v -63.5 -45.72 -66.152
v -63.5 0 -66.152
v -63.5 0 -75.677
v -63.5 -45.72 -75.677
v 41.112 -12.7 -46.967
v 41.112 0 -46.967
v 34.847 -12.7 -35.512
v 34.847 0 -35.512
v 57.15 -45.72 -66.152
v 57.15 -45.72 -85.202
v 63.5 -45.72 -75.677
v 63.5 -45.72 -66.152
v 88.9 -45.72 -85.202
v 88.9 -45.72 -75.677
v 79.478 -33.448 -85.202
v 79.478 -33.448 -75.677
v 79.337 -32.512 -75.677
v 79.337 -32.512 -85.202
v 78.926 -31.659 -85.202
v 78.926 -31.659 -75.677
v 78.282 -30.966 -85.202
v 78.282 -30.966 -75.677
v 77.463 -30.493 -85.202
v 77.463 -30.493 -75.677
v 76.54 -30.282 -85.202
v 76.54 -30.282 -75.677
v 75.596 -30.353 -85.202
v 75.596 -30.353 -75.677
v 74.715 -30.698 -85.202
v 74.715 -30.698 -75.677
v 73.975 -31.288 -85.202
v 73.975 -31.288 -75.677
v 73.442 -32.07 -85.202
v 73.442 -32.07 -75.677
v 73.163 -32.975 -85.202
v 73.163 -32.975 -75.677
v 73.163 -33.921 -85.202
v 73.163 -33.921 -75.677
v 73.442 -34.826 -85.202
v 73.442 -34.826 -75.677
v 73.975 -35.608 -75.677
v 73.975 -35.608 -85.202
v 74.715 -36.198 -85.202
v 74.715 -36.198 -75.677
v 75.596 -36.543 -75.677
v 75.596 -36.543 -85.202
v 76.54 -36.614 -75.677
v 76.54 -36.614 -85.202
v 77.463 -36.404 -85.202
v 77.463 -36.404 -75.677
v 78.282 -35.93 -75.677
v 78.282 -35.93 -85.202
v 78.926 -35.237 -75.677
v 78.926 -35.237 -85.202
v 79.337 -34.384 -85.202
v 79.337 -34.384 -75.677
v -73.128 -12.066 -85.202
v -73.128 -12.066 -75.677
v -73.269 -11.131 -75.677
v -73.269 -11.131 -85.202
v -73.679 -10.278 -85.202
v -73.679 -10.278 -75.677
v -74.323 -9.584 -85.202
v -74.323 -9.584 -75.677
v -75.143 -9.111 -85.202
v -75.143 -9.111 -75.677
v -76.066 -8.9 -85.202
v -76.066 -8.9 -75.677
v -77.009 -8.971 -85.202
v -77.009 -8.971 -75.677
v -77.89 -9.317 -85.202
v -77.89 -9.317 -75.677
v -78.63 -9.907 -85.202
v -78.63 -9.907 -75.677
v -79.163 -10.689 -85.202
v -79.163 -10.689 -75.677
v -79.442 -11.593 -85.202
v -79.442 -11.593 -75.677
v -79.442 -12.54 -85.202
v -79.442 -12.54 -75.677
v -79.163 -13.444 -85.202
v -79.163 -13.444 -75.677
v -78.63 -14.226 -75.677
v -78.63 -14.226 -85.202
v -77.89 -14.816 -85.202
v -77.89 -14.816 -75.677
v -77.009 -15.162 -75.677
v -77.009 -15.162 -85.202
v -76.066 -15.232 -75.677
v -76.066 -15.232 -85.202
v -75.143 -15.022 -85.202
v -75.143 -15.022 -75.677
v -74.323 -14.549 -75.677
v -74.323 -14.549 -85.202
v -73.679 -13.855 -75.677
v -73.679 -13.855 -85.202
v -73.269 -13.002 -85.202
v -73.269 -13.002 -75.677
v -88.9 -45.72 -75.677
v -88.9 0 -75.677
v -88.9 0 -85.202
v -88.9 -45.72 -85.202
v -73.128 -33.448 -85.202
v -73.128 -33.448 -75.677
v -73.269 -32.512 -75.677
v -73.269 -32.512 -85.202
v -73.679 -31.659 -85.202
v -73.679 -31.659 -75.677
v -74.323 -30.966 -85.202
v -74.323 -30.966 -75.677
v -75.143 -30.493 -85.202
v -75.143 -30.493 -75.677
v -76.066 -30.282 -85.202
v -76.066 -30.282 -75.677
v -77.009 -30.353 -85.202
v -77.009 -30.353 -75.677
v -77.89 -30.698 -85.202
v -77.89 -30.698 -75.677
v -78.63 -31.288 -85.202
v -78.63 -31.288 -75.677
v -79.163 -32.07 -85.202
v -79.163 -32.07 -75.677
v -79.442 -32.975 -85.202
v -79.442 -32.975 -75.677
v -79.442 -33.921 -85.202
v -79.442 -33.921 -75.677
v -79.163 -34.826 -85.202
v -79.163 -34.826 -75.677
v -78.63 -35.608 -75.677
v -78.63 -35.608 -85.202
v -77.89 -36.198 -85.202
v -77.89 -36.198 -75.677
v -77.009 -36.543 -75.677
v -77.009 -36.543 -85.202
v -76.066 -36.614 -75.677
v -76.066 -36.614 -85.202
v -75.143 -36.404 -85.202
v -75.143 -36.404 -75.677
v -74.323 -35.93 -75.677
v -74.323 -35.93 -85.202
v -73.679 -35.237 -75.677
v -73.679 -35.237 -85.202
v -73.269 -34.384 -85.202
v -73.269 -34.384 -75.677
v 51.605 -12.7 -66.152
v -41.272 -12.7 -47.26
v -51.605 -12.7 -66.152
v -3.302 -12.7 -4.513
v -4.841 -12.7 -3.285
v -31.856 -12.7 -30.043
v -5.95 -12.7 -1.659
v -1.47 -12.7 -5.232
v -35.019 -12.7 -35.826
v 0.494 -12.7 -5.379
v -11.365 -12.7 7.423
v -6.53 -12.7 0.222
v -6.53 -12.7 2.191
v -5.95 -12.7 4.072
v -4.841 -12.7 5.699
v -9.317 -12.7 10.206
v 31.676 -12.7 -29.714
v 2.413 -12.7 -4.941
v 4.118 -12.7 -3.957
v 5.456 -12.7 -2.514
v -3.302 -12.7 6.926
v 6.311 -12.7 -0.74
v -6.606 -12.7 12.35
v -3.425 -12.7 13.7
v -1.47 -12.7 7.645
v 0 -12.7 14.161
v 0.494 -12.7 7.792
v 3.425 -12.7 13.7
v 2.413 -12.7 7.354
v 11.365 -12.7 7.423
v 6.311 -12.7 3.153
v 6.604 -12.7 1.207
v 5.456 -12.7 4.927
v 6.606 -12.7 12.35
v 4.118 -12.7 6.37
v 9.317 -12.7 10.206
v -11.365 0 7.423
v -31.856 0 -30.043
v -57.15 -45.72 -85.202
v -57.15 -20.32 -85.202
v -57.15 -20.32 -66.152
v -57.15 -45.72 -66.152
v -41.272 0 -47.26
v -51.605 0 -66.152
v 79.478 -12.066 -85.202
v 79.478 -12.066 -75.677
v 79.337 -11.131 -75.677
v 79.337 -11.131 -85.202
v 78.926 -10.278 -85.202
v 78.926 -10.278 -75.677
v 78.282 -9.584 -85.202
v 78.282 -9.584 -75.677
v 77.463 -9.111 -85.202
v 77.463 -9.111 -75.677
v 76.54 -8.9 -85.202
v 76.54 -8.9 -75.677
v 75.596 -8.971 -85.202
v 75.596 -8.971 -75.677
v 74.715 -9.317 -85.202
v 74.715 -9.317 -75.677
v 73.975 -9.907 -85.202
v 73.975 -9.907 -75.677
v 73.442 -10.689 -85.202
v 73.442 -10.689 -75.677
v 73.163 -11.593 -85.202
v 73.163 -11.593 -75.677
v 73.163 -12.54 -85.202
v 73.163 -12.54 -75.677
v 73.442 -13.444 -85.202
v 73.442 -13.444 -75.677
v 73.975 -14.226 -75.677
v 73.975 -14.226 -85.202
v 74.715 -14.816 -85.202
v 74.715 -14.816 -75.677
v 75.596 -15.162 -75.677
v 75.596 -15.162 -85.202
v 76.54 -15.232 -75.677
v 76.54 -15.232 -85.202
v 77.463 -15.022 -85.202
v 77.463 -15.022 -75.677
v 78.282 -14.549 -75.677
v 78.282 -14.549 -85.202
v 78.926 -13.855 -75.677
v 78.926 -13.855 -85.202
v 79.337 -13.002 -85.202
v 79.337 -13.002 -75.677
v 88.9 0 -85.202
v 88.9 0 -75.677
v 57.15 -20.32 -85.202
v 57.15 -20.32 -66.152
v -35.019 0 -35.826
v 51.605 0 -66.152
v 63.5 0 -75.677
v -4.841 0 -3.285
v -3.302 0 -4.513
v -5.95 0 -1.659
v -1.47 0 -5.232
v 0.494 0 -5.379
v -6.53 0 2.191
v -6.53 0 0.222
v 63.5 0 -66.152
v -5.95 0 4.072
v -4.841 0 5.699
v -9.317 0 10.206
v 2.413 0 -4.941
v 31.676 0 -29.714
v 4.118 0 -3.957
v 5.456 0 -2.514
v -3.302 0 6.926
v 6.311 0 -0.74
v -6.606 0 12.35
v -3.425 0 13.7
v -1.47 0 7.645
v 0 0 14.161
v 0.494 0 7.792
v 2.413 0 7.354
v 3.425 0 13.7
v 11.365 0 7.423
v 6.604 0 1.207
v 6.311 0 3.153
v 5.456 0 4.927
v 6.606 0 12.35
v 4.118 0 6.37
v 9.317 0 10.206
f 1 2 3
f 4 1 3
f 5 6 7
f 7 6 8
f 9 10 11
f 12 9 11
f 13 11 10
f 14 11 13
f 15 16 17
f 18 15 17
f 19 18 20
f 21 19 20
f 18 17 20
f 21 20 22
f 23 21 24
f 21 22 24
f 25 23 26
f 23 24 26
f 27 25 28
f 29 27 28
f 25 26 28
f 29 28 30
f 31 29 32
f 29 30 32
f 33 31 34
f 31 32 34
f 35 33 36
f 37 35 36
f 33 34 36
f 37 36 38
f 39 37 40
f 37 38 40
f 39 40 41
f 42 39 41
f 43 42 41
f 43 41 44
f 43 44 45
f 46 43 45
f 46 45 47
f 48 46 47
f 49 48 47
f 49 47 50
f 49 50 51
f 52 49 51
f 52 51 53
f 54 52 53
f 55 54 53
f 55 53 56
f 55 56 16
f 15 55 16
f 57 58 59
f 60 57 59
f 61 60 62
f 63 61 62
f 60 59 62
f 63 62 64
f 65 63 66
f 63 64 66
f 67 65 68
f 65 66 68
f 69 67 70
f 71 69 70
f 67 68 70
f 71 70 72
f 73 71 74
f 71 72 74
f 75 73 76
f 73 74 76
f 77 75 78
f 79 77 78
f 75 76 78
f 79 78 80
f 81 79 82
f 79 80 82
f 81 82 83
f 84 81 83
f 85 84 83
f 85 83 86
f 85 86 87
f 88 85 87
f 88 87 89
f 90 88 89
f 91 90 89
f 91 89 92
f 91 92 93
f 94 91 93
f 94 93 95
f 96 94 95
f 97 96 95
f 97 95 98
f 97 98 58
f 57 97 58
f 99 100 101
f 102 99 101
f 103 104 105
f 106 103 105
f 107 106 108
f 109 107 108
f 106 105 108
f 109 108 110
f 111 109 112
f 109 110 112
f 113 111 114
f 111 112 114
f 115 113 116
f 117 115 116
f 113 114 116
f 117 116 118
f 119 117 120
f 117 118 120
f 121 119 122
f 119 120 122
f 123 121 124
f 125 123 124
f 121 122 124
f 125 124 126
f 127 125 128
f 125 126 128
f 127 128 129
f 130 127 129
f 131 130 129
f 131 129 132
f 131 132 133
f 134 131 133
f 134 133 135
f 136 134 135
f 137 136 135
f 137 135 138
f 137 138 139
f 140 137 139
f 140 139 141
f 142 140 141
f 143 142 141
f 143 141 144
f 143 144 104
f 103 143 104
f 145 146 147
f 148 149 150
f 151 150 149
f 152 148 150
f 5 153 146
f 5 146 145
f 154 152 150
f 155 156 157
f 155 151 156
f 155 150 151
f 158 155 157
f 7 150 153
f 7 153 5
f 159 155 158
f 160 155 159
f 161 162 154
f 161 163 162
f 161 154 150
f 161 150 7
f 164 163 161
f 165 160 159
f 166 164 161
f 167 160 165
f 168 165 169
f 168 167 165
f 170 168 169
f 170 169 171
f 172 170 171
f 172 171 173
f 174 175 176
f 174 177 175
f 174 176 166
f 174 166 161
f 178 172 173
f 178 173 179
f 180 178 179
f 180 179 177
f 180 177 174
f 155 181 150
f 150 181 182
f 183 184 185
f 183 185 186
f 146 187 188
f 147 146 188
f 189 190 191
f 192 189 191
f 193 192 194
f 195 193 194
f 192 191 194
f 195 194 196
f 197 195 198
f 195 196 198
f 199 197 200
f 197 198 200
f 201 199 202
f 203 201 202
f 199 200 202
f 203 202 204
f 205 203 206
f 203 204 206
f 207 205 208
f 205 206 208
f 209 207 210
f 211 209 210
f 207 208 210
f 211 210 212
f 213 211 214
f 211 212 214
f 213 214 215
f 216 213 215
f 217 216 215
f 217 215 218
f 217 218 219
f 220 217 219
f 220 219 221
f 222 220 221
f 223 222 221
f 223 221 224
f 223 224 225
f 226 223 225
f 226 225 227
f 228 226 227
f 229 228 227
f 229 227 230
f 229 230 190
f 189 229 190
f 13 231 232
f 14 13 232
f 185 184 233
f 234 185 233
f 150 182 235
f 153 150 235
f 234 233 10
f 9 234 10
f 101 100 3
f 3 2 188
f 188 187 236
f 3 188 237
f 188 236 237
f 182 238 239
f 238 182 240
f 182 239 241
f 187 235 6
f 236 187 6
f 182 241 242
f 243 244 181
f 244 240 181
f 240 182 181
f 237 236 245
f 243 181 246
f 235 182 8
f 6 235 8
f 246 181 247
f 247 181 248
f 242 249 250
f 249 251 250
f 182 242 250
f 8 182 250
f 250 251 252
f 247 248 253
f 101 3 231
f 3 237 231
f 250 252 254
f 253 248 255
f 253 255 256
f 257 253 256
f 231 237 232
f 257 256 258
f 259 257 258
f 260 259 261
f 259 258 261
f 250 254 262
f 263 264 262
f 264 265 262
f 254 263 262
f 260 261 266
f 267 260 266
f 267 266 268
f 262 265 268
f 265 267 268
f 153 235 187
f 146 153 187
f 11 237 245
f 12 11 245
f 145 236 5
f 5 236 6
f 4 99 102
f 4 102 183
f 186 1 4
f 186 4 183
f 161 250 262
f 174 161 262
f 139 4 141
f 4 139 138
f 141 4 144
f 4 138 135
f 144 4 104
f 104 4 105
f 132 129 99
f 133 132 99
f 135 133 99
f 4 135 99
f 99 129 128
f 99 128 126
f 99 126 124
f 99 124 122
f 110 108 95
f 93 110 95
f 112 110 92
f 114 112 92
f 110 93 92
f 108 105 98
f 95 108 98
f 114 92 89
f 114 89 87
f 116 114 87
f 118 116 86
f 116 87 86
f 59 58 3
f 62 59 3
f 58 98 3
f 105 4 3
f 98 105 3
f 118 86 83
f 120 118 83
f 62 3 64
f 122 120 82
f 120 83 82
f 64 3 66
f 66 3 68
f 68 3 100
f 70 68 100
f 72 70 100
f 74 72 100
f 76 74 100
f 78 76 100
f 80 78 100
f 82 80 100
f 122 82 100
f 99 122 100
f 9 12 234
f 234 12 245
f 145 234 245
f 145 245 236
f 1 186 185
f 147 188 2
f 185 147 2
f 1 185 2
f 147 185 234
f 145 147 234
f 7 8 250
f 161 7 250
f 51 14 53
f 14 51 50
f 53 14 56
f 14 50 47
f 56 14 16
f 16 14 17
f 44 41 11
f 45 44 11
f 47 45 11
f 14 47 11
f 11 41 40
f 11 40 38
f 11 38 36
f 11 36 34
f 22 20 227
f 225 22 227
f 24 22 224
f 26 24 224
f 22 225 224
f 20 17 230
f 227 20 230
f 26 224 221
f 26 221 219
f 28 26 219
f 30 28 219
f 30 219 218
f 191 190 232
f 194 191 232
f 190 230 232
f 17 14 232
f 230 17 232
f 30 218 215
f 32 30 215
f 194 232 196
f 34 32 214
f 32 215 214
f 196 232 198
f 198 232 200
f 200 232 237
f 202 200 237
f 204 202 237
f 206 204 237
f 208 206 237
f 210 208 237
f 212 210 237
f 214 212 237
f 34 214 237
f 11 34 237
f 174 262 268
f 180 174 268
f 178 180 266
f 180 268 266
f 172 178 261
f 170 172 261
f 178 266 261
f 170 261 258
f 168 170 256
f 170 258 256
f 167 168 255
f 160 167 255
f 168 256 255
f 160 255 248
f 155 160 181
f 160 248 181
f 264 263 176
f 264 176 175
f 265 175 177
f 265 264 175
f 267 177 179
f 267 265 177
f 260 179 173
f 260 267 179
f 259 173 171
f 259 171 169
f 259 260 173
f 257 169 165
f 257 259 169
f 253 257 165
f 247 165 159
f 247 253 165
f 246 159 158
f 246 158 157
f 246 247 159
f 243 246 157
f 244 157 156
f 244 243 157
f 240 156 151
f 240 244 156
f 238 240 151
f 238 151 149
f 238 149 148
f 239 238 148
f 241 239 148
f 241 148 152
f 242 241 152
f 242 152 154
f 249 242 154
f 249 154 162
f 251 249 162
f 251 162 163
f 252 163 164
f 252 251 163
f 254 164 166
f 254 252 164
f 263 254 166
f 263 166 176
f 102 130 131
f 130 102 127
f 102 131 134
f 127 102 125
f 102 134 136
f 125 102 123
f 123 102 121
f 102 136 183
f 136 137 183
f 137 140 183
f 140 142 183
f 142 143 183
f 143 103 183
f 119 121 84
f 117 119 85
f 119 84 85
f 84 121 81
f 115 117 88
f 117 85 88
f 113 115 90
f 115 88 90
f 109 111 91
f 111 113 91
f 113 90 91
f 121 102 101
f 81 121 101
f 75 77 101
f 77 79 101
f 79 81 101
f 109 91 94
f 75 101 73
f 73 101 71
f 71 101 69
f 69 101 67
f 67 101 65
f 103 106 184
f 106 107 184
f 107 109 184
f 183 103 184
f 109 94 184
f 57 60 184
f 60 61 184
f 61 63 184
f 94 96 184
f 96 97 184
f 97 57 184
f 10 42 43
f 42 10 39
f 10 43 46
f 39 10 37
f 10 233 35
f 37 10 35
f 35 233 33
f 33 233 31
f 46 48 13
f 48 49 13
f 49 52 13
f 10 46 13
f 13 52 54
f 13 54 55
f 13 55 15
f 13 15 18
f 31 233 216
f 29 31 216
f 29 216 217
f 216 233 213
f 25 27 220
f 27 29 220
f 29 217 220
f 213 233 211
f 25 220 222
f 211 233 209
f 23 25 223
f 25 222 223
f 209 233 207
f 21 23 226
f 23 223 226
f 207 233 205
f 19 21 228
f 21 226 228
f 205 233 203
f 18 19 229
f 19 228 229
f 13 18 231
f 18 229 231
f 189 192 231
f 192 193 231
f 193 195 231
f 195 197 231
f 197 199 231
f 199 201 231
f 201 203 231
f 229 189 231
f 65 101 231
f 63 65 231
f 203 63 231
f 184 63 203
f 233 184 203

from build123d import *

# Parameters (mm, degrees)
F0_R     = 6.604
F1_DEPTH = 12.7
F2_DEPTH = 45.72
F3_R     = 3.175
F4_DEPTH = 9.526
F5_W     = 114.3
F5_H     = 25.4
F6_DEPTH = 99.363775


with BuildPart() as f1:
    # F0 (on Front) → F1 (new body)
    with BuildSketch(Plane.XZ):
        with BuildLine():
            Line((34.847204, -35.512234), (31.675881, -29.713739))
            Line((31.675881, -29.713739), (11.365242, 7.42254))
            ThreePointArc((11.365242, 7.42254), (0, 14.160641), (-11.365242, 7.42254))
            Line((-11.365242, 7.42254), (-31.85621, -30.043455))
            Line((-31.85621, -30.043455), (-35.018866, -35.826104))
            Line((-35.018866, -35.826104), (-41.272096, -47.259603))
            Line((-41.272096, -47.259603), (-51.604832, -66.152134))
            Line((-51.604832, -66.152134), (51.604832, -66.152134))
            Line((51.604832, -66.152134), (41.11215, -46.967155))
            Line((41.11215, -46.967155), (34.847204, -35.512234))
        make_face()
        with Locations((0, 1.206641)):
            Circle(F0_R, mode=Mode.SUBTRACT)
    extrude(amount=F1_DEPTH)

    # F0 (on Front) → F2 (join)
    with BuildSketch(Plane.XZ):
        Polygon((63.5, -66.152134), (51.604832, -66.152134), (-51.604832, -66.152134), (-63.5, -66.152134), (-63.5, -75.677134), (-88.9, -75.677134), (-88.9, -85.202134), (88.9, -85.202134), (88.9, -75.677134), (63.5, -75.677134), align=None)
    extrude(amount=F2_DEPTH)

    # F3 (on face) → F4 (cut, through all)
    with BuildSketch(Plane.XY.offset(-75.677134)):
        with Locations((-76.302797, -12.066366)):
            Circle(F3_R)
        with Locations((-76.302797, -33.448037)):
            Circle(F3_R)
        with Locations((76.302797, -12.066366)):
            Circle(F3_R)
        with Locations((76.302797, -33.448037)):
            Circle(F3_R)
    extrude(amount=-F4_DEPTH, mode=Mode.SUBTRACT)

    # F5 (on face) → F6 (cut, through all)
    with BuildSketch(Plane(origin=(0, 0, -85.202134), x_dir=(1, 0, 0), z_dir=(0, 0, -1))):
        with Locations((0, 33.02)):
            Rectangle(F5_W, F5_H)
    extrude(amount=-F6_DEPTH, mode=Mode.SUBTRACT)


solid = f1.part
